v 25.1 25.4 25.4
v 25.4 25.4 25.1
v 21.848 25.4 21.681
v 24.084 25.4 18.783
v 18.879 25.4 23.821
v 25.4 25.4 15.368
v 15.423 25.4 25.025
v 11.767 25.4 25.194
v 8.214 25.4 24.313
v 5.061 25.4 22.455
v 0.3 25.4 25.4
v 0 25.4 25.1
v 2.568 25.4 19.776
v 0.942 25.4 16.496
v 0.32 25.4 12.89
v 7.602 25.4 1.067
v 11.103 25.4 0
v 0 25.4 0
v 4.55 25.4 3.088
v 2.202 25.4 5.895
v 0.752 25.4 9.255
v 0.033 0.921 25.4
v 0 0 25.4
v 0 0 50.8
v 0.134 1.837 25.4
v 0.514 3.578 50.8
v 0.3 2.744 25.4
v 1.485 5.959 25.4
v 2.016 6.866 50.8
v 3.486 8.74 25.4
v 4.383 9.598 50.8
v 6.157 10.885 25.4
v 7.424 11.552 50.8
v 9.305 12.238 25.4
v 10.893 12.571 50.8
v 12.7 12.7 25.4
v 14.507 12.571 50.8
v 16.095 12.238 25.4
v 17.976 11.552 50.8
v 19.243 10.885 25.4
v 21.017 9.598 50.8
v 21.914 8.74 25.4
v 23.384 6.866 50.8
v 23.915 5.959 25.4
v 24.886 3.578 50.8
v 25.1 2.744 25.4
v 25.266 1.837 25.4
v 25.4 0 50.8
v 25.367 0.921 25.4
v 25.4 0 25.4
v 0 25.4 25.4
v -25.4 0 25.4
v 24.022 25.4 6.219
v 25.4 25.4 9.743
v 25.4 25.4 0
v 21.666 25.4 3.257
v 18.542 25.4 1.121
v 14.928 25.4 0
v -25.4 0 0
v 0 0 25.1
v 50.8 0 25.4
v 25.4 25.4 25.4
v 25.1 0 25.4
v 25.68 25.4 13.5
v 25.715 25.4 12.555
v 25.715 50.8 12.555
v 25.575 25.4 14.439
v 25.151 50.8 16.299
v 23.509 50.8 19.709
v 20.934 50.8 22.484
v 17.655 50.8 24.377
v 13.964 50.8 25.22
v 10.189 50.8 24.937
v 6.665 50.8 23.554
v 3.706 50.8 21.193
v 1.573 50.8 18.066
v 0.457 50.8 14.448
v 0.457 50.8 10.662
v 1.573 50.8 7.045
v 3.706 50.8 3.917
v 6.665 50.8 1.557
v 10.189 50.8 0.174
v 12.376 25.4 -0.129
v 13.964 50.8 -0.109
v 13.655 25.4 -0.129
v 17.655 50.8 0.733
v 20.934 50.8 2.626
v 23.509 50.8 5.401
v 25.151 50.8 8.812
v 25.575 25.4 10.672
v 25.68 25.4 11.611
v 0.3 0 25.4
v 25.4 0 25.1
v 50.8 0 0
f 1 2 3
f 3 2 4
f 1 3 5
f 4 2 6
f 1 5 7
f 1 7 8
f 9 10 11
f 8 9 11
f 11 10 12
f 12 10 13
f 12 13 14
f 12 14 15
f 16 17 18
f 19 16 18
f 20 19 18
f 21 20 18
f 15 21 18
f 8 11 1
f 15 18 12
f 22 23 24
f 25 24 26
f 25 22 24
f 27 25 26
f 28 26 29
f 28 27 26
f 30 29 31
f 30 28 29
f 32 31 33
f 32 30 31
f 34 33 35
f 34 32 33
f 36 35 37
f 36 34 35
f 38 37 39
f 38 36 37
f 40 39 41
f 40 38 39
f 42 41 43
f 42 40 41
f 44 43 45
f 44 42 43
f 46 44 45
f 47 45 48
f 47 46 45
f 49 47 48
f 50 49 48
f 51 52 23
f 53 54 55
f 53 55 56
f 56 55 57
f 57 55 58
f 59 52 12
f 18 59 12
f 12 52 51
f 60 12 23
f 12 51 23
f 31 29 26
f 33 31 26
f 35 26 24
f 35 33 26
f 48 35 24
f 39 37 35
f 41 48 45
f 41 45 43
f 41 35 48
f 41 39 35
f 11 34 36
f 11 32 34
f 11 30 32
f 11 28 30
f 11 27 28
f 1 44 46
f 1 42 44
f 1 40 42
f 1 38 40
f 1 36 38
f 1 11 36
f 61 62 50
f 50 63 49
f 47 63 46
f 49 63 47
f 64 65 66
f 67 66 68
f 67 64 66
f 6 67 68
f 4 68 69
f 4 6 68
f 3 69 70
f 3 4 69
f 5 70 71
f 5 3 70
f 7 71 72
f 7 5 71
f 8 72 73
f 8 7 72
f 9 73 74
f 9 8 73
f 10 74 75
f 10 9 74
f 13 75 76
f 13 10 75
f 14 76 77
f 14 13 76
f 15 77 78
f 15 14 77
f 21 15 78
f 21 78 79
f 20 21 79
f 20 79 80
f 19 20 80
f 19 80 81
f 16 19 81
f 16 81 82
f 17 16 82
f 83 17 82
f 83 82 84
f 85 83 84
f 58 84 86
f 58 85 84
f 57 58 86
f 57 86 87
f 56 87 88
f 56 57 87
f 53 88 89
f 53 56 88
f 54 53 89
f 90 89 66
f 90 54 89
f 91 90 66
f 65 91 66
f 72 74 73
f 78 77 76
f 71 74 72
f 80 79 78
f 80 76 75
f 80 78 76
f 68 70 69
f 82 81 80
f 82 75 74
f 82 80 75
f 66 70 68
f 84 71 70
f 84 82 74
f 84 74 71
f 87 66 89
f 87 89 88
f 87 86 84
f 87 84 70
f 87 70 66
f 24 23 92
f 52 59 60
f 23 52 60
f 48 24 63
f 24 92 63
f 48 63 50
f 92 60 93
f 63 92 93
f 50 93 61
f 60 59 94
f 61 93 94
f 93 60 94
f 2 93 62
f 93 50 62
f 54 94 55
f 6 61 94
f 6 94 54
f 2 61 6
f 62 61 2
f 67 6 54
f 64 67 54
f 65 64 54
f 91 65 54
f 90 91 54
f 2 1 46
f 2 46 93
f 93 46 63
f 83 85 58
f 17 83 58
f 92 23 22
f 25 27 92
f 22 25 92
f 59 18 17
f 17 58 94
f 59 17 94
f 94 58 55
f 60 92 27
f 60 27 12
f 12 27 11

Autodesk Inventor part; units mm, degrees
ref_plane "YZ Plane" through (0, 0, 0) normal (1, 0, 0) x (0, 1, 0)
ref_plane "XZ Plane" through (0, 0, 0) normal (0, 1, 0) x (-1, 0, 0)
sketch "Sketch1" plane through (0, 0, 0) normal (0, 0, 1) x (1, 0, 0)
  line L0 (0, 0) -> (25.4, 0)
  line L1 (25.4, 0) -> (25.4, 25.4)
  line L2 (25.4, 25.4) -> (0, 25.4)
  line L3 (0, 25.4) -> (0, 0)
  line L4 (25.4, 0) -> (50.8, 0)
  line L5 (50.8, 0) -> (25.4, 25.4)
  line L6 (0, 0) -> (-25.4, 0)
  line L7 (-25.4, 0) -> (0, 25.4)
  dimension "d0" = 25.4
  dimension "d1" = 25.4
  dimension "d2" = 25.4
  dimension "d3" = 25.4
extrude "Extrusion1" add sketch "Sketch1" along normal blind 25.4 contours L3 L2 L1 L0
chamfer "Chamfer1" distance 0.3 angle 45 2 edges at (25.4, 12.7, 25.4) (0, 12.7, 25.4)
sketch "Sketch2" plane through (0, 0, 25.4) normal (0, 0, 1) x (1, 0, 0)
  line L0 (0, 0) -> (-25.4, 0)
  line L1 (0, 25.4) -> (0, 0) projected
  line L2 (-25.4, 0) -> (0, 25.4)
  line L3 (25.4, 0) -> (50.8, 0)
  line L4 (50.8, 0) -> (25.4, 25.4)
  dimension "d9" = 25.4
  dimension "d10" = 25.4
extrude "Extrusion2" add sketch "Sketch2" against normal blind 25.4
sketch "Sketch3" plane through (0, 0, 25.4) normal (0, 0, 1) x (1, 0, 0)
  line L0 (-25.4, 0) -> (25.4, 0) projected
  line L1 (25.4, 0) -> (50.8, 0)
  line L2 (25.4, 0) -> (25.4, 25.4) projected
  line L3 (50.8, 0) -> (25.4, 25.4)
  point P0 (0, 0)
  dimension "d13" = 25.4
extrude "Extrusion3" add sketch "Sketch3" against normal blind 25.4
sketch "Sketch4" plane through (0, 0, 25.4) normal (0, 0, 1) x (1, 0, 0)
  line L0 (0.3, 0) -> (25.1, 0) projected
  circle A0 centre (12.7, 0) radius 12.7
  point P0 (0, 0)
  dimension "d16" = 25.4
extrude "Extrusion4" add sketch "Sketch4" along normal blind 25.4
ref_plane "Work Plane1" through (0, 0, 25.4) normal (0, 0, 1) x (1, 0, 0)
sketch "Sketch5" plane through (0, 0, 25.4) normal (0, 0, 1) x (1, 0, 0)
  line L0 (0, 0) -> (-25.4, 0) projected
  line L1 (0, 0) -> (42.4435, 0)
  line L2 (42.4435, 0) -> (42.4435, -16.3705)
  line L3 (42.4435, -16.3705) -> (0, -16.3705)
  line L4 (0, -16.3705) -> (0, 0)
  circle A0 centre (12.7, 0) radius 12.7 projected
extrude "Extrusion5" cut sketch "Sketch5" along normal blind 25.4 contours A0 L1 L2 L3 L4 | L1 A0 picked at (10.2952, -3.484)
sketch "Sketch6" plane through (0.3, 25.4, 25.4) normal (0, 1, 0) x (1, 0, 0)
  point P0 (-0.3, 25.4)
sketch "Sketch7" plane through (0.3, 25.4, 25.4) normal (0, 1, 0) x (1, 0, 0)
  point P0 (-0.3, 25.4)
sketch "Sketch8" plane through (0.3, 25.4, 25.4) normal (0, 1, 0) x (1, 0, 0)
  circle A0 centre (12.7153, 12.8448) radius 12.7
  point P0 (-0.3, 25.4)
  dimension "d22" = 25.4
extrude "Extrusion6" add sketch "Sketch8" along normal blind 25.4
properties part number "orthographic1"
